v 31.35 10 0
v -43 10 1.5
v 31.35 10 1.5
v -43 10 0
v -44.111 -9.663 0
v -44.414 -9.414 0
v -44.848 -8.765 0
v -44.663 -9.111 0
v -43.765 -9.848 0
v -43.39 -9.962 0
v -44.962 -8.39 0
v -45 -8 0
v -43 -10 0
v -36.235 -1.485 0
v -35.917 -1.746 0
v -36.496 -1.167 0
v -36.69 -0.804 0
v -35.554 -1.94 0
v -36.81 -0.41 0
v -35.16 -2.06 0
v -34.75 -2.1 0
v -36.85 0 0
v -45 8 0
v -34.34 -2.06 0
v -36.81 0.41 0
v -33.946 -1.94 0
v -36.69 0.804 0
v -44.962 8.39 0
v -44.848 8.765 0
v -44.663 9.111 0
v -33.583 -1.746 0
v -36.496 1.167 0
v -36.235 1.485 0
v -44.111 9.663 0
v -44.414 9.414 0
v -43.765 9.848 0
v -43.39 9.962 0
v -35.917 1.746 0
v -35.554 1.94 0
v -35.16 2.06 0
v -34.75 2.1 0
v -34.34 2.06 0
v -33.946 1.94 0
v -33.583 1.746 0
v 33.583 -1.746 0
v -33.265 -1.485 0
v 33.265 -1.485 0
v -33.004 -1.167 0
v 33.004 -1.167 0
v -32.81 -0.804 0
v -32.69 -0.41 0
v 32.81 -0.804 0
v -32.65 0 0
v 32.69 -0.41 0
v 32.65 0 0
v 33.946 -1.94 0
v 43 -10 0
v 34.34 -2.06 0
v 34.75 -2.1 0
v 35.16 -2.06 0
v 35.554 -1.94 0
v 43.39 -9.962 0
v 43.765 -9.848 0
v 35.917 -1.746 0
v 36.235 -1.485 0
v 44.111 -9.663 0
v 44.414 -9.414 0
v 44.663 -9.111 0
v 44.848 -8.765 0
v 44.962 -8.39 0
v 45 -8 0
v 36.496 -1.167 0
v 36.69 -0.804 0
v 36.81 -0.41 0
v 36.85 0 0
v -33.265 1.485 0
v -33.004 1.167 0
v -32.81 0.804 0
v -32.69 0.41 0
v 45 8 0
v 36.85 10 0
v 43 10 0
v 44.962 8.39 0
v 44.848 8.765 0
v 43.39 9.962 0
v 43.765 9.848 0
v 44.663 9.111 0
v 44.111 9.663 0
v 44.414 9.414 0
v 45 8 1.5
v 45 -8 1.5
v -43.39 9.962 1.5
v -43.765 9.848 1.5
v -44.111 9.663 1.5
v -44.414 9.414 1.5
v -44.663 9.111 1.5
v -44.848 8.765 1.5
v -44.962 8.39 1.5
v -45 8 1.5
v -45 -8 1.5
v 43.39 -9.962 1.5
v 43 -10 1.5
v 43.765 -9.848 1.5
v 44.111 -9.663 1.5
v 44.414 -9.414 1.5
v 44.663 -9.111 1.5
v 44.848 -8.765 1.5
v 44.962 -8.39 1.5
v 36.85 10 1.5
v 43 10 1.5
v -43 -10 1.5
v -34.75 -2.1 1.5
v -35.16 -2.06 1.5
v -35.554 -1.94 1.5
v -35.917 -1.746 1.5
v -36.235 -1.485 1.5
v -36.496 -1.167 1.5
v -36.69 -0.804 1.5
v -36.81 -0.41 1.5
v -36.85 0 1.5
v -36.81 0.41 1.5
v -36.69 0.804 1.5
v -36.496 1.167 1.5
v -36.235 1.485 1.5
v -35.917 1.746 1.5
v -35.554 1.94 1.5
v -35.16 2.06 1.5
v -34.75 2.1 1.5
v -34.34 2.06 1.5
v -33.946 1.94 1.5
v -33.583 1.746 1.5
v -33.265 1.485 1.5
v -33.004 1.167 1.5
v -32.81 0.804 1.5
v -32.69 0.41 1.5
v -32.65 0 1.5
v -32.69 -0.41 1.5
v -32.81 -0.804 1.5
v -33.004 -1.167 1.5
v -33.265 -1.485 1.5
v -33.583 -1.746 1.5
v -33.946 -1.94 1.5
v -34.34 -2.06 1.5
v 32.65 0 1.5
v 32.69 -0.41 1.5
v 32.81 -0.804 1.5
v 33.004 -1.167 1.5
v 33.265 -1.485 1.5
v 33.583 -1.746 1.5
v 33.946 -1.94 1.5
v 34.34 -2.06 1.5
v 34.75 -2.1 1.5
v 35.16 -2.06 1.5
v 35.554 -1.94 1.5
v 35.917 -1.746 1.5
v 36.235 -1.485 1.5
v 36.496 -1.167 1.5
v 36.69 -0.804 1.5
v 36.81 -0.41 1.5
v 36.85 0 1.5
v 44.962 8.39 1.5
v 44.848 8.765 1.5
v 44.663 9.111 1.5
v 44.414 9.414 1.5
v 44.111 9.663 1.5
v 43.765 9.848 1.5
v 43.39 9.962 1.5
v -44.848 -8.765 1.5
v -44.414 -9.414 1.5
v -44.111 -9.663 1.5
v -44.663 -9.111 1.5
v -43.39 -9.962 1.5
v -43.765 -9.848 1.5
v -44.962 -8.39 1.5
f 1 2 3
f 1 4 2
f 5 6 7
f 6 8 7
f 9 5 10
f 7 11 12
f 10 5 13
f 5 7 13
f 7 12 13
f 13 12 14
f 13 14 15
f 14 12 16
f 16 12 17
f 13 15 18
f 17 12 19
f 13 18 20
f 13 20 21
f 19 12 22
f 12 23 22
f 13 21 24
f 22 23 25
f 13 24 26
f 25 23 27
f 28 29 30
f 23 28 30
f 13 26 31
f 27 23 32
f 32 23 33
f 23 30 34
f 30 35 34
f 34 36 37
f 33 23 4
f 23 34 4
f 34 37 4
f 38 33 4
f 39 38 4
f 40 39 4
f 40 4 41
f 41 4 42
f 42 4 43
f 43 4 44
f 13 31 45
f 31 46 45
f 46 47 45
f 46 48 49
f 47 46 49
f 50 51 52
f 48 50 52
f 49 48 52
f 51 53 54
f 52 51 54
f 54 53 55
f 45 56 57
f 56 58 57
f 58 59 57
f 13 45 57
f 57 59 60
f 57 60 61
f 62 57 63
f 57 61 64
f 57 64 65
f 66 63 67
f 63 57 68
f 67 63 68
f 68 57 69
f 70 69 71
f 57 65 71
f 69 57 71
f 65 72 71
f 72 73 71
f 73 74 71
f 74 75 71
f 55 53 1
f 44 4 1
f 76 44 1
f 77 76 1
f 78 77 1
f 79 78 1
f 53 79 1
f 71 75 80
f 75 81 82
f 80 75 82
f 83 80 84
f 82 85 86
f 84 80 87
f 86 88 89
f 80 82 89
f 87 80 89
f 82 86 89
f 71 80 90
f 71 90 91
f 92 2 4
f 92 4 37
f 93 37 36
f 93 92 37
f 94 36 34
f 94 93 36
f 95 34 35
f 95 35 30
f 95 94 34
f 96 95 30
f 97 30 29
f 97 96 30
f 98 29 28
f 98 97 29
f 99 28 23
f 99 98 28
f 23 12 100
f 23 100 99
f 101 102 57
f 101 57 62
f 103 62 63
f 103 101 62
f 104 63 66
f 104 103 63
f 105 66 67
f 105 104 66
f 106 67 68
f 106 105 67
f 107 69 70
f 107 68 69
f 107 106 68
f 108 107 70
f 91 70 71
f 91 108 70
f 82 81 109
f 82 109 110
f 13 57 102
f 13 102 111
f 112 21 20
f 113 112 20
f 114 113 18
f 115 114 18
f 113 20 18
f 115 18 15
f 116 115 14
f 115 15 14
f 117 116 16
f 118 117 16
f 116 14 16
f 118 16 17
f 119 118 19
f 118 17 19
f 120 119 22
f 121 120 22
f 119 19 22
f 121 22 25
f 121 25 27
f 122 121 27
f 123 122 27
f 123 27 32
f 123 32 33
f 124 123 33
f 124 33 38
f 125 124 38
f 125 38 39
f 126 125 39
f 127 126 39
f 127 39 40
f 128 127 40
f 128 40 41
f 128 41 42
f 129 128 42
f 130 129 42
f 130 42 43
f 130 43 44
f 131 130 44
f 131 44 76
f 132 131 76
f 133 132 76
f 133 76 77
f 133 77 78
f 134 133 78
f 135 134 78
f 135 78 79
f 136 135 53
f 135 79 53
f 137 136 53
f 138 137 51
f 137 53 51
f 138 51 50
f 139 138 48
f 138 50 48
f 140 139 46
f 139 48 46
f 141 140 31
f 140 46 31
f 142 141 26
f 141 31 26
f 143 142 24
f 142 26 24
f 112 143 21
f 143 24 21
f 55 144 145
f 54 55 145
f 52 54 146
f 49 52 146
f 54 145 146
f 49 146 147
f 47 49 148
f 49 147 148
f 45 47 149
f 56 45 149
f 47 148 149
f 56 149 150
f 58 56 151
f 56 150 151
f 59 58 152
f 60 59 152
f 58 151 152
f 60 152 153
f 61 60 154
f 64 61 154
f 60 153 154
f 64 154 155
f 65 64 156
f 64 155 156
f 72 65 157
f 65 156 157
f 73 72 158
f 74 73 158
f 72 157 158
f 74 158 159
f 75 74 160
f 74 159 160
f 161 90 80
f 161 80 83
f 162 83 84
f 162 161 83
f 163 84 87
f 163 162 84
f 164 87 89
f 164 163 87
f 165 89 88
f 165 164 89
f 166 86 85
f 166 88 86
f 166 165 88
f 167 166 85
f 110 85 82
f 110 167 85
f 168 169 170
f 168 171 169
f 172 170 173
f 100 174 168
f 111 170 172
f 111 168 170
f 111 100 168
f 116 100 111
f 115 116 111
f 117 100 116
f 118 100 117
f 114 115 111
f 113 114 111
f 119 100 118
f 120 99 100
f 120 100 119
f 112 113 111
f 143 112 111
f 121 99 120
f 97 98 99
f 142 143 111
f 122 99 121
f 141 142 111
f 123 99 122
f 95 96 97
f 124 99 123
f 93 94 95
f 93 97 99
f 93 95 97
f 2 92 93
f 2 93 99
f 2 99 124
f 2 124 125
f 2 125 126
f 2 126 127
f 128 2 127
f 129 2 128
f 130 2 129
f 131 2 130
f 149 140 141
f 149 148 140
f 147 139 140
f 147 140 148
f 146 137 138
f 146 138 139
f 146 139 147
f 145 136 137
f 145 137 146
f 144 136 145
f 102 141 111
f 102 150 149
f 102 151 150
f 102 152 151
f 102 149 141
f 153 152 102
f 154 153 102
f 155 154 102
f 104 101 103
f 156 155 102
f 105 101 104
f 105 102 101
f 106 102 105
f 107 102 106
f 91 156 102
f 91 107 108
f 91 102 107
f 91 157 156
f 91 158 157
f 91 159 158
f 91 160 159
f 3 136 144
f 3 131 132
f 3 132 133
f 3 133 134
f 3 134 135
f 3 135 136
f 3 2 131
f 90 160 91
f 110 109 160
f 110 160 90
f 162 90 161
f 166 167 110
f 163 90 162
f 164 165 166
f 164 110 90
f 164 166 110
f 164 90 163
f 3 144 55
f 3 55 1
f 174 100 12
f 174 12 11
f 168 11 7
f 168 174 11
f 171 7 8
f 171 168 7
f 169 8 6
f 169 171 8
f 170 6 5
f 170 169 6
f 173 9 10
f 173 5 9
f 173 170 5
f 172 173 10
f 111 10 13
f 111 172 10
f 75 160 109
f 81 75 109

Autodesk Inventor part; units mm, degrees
ref_plane "YZ Plane" through (0, 0, 0) normal (1, 0, 0) x (0, 1, 0)
ref_plane "XZ Plane" through (0, 0, 0) normal (0, 1, 0) x (-1, 0, 0)
ref_plane "XY Plane" through (0, 0, 0) normal (0, 0, 1) x (1, 0, 0)
sketch "Sketch1" plane through (0, 0, 0) normal (0, 0, 1) x (1, 0, 0)
  line L0 (-45, 10) -> (45, 10)
  line L1 (45, 10) -> (45, -10)
  line L2 (45, -10) -> (-45, -10)
  line L3 (-45, -10) -> (-45, 10)
  line L4 (0, 0) -> (0, 7.2508) construction
  line L5 (0, 0) -> (8.0596, 0) construction
  dimension "d0" = 90
  dimension "d1" = 20
extrude "Plate1" add sketch "Sketch1" along normal blind 1.5
fillet "Fillet1" radius 2 4 edges at (45, 10, 0.75) (45, -10, 0.75) (-45, -10, 0.75) (-45, 10, 0.75)
sketch "Sketch2" plane through (0, 0, 1.5) normal (0, 0, 1) x (1, 0, 0)
  line L0 (-45, -8) -> (-45, 8) projected
  line L1 (45, 8) -> (45, -8) projected
  arc A0 (32.65, 0) -> (36.85, 0) centre (34.75, 0) ccw
  line L2 (36.85, 0) -> (36.85, 10)
  line L3 (32.65, 0) -> (32.65, 10)
  line L4 (43, -10) -> (-43, -10) projected
  line L5 (-43, 10) -> (43, 10) projected
  point P0 (0, 0)
  dimension "d5" = 10.25
  dimension "d6" = 4.2
  dimension "d7" = 10
extrude "Cut1" cut sketch "Sketch2" against normal blind 1.5
sketch "Sketch3" plane through (0, 0, 1.5) normal (0, 0, 1) x (1, 0, 0)
  line L0 (-45, -8) -> (-45, 8) projected
  point P0 (0, 0)
  point P1 (-34.75, 0)
  dimension "d10" = 10.25
hole "Hole1" at (-34.75, 0, 1.5) direction (0, 0, -1) diameter 4.2 depth 1.5 tip angle 118
sketch "Sketch5" plane through (0, 0, 1.5) normal (0, 0, 1) x (1, 0, 0)
  circle A0 centre (34.0345, 9.9478) radius 2.121 projected
  arc A1 (32.65, 0) -> (36.85, 0) centre (34.75, 0) ccw projected
  line L0 (34.75, 0) -> (34.0345, 9.9478)
  line L1 (32.65, 0) -> (31.9141, 10)
  line L2 (-43, 10) -> (32.65, 10) projected
  line L3 (36.85, 0) -> (36.1504, 10.0945)
  line L4 (32.65, 0) -> (32.65, 10) projected
  line L5 (32.65, 0) -> (32.65, 10)
  line L6 (32.65, 10) -> (31.9141, 10)
  line L7 (32.65, 10) -> (32.65, 0) projected
  line L8 (32.65, 0) -> (31.35, 10)
  line L9 (-43, 10) -> (32.65, 10) projected
  line L10 (31.35, 10) -> (32.65, 10)
  point P0 (0, 0)
  dimension "d20" = 1.3
extrude "Cut2" cut sketch "Sketch5" against normal blind 1.5 contours L1 A0 | L2 L4 A0 L1 | A0 L1 L8 L2 | L4 L1 A0
equation "\"d8\" = Thickness"
equation "\"d16\" = Thickness"
equation "\"d18\" = Thickness"
equation "\"d2\" = Thickness"
equation "\"BendRadius\" = Thickness"
equation "\"BendReliefWidth\" = Thickness"
equation "\"BendReliefDepth\" = 0.5 * Thickness"
equation "\"CornerReliefSize\" = 4 * Thickness"
equation "\"MinimumRemnant\" = 2 * Thickness"
equation "\"TransitionRadius\" = BendRadius"
equation "\"JacobiRadiusSize\" = BendRadius"
equation "\"GapSize\" = Thickness"
equation "\"Thickness\" = 1.5"
properties part number "3d_LM-Welding_Tooling -  Tab" material "Aluminium 6061-T6"
